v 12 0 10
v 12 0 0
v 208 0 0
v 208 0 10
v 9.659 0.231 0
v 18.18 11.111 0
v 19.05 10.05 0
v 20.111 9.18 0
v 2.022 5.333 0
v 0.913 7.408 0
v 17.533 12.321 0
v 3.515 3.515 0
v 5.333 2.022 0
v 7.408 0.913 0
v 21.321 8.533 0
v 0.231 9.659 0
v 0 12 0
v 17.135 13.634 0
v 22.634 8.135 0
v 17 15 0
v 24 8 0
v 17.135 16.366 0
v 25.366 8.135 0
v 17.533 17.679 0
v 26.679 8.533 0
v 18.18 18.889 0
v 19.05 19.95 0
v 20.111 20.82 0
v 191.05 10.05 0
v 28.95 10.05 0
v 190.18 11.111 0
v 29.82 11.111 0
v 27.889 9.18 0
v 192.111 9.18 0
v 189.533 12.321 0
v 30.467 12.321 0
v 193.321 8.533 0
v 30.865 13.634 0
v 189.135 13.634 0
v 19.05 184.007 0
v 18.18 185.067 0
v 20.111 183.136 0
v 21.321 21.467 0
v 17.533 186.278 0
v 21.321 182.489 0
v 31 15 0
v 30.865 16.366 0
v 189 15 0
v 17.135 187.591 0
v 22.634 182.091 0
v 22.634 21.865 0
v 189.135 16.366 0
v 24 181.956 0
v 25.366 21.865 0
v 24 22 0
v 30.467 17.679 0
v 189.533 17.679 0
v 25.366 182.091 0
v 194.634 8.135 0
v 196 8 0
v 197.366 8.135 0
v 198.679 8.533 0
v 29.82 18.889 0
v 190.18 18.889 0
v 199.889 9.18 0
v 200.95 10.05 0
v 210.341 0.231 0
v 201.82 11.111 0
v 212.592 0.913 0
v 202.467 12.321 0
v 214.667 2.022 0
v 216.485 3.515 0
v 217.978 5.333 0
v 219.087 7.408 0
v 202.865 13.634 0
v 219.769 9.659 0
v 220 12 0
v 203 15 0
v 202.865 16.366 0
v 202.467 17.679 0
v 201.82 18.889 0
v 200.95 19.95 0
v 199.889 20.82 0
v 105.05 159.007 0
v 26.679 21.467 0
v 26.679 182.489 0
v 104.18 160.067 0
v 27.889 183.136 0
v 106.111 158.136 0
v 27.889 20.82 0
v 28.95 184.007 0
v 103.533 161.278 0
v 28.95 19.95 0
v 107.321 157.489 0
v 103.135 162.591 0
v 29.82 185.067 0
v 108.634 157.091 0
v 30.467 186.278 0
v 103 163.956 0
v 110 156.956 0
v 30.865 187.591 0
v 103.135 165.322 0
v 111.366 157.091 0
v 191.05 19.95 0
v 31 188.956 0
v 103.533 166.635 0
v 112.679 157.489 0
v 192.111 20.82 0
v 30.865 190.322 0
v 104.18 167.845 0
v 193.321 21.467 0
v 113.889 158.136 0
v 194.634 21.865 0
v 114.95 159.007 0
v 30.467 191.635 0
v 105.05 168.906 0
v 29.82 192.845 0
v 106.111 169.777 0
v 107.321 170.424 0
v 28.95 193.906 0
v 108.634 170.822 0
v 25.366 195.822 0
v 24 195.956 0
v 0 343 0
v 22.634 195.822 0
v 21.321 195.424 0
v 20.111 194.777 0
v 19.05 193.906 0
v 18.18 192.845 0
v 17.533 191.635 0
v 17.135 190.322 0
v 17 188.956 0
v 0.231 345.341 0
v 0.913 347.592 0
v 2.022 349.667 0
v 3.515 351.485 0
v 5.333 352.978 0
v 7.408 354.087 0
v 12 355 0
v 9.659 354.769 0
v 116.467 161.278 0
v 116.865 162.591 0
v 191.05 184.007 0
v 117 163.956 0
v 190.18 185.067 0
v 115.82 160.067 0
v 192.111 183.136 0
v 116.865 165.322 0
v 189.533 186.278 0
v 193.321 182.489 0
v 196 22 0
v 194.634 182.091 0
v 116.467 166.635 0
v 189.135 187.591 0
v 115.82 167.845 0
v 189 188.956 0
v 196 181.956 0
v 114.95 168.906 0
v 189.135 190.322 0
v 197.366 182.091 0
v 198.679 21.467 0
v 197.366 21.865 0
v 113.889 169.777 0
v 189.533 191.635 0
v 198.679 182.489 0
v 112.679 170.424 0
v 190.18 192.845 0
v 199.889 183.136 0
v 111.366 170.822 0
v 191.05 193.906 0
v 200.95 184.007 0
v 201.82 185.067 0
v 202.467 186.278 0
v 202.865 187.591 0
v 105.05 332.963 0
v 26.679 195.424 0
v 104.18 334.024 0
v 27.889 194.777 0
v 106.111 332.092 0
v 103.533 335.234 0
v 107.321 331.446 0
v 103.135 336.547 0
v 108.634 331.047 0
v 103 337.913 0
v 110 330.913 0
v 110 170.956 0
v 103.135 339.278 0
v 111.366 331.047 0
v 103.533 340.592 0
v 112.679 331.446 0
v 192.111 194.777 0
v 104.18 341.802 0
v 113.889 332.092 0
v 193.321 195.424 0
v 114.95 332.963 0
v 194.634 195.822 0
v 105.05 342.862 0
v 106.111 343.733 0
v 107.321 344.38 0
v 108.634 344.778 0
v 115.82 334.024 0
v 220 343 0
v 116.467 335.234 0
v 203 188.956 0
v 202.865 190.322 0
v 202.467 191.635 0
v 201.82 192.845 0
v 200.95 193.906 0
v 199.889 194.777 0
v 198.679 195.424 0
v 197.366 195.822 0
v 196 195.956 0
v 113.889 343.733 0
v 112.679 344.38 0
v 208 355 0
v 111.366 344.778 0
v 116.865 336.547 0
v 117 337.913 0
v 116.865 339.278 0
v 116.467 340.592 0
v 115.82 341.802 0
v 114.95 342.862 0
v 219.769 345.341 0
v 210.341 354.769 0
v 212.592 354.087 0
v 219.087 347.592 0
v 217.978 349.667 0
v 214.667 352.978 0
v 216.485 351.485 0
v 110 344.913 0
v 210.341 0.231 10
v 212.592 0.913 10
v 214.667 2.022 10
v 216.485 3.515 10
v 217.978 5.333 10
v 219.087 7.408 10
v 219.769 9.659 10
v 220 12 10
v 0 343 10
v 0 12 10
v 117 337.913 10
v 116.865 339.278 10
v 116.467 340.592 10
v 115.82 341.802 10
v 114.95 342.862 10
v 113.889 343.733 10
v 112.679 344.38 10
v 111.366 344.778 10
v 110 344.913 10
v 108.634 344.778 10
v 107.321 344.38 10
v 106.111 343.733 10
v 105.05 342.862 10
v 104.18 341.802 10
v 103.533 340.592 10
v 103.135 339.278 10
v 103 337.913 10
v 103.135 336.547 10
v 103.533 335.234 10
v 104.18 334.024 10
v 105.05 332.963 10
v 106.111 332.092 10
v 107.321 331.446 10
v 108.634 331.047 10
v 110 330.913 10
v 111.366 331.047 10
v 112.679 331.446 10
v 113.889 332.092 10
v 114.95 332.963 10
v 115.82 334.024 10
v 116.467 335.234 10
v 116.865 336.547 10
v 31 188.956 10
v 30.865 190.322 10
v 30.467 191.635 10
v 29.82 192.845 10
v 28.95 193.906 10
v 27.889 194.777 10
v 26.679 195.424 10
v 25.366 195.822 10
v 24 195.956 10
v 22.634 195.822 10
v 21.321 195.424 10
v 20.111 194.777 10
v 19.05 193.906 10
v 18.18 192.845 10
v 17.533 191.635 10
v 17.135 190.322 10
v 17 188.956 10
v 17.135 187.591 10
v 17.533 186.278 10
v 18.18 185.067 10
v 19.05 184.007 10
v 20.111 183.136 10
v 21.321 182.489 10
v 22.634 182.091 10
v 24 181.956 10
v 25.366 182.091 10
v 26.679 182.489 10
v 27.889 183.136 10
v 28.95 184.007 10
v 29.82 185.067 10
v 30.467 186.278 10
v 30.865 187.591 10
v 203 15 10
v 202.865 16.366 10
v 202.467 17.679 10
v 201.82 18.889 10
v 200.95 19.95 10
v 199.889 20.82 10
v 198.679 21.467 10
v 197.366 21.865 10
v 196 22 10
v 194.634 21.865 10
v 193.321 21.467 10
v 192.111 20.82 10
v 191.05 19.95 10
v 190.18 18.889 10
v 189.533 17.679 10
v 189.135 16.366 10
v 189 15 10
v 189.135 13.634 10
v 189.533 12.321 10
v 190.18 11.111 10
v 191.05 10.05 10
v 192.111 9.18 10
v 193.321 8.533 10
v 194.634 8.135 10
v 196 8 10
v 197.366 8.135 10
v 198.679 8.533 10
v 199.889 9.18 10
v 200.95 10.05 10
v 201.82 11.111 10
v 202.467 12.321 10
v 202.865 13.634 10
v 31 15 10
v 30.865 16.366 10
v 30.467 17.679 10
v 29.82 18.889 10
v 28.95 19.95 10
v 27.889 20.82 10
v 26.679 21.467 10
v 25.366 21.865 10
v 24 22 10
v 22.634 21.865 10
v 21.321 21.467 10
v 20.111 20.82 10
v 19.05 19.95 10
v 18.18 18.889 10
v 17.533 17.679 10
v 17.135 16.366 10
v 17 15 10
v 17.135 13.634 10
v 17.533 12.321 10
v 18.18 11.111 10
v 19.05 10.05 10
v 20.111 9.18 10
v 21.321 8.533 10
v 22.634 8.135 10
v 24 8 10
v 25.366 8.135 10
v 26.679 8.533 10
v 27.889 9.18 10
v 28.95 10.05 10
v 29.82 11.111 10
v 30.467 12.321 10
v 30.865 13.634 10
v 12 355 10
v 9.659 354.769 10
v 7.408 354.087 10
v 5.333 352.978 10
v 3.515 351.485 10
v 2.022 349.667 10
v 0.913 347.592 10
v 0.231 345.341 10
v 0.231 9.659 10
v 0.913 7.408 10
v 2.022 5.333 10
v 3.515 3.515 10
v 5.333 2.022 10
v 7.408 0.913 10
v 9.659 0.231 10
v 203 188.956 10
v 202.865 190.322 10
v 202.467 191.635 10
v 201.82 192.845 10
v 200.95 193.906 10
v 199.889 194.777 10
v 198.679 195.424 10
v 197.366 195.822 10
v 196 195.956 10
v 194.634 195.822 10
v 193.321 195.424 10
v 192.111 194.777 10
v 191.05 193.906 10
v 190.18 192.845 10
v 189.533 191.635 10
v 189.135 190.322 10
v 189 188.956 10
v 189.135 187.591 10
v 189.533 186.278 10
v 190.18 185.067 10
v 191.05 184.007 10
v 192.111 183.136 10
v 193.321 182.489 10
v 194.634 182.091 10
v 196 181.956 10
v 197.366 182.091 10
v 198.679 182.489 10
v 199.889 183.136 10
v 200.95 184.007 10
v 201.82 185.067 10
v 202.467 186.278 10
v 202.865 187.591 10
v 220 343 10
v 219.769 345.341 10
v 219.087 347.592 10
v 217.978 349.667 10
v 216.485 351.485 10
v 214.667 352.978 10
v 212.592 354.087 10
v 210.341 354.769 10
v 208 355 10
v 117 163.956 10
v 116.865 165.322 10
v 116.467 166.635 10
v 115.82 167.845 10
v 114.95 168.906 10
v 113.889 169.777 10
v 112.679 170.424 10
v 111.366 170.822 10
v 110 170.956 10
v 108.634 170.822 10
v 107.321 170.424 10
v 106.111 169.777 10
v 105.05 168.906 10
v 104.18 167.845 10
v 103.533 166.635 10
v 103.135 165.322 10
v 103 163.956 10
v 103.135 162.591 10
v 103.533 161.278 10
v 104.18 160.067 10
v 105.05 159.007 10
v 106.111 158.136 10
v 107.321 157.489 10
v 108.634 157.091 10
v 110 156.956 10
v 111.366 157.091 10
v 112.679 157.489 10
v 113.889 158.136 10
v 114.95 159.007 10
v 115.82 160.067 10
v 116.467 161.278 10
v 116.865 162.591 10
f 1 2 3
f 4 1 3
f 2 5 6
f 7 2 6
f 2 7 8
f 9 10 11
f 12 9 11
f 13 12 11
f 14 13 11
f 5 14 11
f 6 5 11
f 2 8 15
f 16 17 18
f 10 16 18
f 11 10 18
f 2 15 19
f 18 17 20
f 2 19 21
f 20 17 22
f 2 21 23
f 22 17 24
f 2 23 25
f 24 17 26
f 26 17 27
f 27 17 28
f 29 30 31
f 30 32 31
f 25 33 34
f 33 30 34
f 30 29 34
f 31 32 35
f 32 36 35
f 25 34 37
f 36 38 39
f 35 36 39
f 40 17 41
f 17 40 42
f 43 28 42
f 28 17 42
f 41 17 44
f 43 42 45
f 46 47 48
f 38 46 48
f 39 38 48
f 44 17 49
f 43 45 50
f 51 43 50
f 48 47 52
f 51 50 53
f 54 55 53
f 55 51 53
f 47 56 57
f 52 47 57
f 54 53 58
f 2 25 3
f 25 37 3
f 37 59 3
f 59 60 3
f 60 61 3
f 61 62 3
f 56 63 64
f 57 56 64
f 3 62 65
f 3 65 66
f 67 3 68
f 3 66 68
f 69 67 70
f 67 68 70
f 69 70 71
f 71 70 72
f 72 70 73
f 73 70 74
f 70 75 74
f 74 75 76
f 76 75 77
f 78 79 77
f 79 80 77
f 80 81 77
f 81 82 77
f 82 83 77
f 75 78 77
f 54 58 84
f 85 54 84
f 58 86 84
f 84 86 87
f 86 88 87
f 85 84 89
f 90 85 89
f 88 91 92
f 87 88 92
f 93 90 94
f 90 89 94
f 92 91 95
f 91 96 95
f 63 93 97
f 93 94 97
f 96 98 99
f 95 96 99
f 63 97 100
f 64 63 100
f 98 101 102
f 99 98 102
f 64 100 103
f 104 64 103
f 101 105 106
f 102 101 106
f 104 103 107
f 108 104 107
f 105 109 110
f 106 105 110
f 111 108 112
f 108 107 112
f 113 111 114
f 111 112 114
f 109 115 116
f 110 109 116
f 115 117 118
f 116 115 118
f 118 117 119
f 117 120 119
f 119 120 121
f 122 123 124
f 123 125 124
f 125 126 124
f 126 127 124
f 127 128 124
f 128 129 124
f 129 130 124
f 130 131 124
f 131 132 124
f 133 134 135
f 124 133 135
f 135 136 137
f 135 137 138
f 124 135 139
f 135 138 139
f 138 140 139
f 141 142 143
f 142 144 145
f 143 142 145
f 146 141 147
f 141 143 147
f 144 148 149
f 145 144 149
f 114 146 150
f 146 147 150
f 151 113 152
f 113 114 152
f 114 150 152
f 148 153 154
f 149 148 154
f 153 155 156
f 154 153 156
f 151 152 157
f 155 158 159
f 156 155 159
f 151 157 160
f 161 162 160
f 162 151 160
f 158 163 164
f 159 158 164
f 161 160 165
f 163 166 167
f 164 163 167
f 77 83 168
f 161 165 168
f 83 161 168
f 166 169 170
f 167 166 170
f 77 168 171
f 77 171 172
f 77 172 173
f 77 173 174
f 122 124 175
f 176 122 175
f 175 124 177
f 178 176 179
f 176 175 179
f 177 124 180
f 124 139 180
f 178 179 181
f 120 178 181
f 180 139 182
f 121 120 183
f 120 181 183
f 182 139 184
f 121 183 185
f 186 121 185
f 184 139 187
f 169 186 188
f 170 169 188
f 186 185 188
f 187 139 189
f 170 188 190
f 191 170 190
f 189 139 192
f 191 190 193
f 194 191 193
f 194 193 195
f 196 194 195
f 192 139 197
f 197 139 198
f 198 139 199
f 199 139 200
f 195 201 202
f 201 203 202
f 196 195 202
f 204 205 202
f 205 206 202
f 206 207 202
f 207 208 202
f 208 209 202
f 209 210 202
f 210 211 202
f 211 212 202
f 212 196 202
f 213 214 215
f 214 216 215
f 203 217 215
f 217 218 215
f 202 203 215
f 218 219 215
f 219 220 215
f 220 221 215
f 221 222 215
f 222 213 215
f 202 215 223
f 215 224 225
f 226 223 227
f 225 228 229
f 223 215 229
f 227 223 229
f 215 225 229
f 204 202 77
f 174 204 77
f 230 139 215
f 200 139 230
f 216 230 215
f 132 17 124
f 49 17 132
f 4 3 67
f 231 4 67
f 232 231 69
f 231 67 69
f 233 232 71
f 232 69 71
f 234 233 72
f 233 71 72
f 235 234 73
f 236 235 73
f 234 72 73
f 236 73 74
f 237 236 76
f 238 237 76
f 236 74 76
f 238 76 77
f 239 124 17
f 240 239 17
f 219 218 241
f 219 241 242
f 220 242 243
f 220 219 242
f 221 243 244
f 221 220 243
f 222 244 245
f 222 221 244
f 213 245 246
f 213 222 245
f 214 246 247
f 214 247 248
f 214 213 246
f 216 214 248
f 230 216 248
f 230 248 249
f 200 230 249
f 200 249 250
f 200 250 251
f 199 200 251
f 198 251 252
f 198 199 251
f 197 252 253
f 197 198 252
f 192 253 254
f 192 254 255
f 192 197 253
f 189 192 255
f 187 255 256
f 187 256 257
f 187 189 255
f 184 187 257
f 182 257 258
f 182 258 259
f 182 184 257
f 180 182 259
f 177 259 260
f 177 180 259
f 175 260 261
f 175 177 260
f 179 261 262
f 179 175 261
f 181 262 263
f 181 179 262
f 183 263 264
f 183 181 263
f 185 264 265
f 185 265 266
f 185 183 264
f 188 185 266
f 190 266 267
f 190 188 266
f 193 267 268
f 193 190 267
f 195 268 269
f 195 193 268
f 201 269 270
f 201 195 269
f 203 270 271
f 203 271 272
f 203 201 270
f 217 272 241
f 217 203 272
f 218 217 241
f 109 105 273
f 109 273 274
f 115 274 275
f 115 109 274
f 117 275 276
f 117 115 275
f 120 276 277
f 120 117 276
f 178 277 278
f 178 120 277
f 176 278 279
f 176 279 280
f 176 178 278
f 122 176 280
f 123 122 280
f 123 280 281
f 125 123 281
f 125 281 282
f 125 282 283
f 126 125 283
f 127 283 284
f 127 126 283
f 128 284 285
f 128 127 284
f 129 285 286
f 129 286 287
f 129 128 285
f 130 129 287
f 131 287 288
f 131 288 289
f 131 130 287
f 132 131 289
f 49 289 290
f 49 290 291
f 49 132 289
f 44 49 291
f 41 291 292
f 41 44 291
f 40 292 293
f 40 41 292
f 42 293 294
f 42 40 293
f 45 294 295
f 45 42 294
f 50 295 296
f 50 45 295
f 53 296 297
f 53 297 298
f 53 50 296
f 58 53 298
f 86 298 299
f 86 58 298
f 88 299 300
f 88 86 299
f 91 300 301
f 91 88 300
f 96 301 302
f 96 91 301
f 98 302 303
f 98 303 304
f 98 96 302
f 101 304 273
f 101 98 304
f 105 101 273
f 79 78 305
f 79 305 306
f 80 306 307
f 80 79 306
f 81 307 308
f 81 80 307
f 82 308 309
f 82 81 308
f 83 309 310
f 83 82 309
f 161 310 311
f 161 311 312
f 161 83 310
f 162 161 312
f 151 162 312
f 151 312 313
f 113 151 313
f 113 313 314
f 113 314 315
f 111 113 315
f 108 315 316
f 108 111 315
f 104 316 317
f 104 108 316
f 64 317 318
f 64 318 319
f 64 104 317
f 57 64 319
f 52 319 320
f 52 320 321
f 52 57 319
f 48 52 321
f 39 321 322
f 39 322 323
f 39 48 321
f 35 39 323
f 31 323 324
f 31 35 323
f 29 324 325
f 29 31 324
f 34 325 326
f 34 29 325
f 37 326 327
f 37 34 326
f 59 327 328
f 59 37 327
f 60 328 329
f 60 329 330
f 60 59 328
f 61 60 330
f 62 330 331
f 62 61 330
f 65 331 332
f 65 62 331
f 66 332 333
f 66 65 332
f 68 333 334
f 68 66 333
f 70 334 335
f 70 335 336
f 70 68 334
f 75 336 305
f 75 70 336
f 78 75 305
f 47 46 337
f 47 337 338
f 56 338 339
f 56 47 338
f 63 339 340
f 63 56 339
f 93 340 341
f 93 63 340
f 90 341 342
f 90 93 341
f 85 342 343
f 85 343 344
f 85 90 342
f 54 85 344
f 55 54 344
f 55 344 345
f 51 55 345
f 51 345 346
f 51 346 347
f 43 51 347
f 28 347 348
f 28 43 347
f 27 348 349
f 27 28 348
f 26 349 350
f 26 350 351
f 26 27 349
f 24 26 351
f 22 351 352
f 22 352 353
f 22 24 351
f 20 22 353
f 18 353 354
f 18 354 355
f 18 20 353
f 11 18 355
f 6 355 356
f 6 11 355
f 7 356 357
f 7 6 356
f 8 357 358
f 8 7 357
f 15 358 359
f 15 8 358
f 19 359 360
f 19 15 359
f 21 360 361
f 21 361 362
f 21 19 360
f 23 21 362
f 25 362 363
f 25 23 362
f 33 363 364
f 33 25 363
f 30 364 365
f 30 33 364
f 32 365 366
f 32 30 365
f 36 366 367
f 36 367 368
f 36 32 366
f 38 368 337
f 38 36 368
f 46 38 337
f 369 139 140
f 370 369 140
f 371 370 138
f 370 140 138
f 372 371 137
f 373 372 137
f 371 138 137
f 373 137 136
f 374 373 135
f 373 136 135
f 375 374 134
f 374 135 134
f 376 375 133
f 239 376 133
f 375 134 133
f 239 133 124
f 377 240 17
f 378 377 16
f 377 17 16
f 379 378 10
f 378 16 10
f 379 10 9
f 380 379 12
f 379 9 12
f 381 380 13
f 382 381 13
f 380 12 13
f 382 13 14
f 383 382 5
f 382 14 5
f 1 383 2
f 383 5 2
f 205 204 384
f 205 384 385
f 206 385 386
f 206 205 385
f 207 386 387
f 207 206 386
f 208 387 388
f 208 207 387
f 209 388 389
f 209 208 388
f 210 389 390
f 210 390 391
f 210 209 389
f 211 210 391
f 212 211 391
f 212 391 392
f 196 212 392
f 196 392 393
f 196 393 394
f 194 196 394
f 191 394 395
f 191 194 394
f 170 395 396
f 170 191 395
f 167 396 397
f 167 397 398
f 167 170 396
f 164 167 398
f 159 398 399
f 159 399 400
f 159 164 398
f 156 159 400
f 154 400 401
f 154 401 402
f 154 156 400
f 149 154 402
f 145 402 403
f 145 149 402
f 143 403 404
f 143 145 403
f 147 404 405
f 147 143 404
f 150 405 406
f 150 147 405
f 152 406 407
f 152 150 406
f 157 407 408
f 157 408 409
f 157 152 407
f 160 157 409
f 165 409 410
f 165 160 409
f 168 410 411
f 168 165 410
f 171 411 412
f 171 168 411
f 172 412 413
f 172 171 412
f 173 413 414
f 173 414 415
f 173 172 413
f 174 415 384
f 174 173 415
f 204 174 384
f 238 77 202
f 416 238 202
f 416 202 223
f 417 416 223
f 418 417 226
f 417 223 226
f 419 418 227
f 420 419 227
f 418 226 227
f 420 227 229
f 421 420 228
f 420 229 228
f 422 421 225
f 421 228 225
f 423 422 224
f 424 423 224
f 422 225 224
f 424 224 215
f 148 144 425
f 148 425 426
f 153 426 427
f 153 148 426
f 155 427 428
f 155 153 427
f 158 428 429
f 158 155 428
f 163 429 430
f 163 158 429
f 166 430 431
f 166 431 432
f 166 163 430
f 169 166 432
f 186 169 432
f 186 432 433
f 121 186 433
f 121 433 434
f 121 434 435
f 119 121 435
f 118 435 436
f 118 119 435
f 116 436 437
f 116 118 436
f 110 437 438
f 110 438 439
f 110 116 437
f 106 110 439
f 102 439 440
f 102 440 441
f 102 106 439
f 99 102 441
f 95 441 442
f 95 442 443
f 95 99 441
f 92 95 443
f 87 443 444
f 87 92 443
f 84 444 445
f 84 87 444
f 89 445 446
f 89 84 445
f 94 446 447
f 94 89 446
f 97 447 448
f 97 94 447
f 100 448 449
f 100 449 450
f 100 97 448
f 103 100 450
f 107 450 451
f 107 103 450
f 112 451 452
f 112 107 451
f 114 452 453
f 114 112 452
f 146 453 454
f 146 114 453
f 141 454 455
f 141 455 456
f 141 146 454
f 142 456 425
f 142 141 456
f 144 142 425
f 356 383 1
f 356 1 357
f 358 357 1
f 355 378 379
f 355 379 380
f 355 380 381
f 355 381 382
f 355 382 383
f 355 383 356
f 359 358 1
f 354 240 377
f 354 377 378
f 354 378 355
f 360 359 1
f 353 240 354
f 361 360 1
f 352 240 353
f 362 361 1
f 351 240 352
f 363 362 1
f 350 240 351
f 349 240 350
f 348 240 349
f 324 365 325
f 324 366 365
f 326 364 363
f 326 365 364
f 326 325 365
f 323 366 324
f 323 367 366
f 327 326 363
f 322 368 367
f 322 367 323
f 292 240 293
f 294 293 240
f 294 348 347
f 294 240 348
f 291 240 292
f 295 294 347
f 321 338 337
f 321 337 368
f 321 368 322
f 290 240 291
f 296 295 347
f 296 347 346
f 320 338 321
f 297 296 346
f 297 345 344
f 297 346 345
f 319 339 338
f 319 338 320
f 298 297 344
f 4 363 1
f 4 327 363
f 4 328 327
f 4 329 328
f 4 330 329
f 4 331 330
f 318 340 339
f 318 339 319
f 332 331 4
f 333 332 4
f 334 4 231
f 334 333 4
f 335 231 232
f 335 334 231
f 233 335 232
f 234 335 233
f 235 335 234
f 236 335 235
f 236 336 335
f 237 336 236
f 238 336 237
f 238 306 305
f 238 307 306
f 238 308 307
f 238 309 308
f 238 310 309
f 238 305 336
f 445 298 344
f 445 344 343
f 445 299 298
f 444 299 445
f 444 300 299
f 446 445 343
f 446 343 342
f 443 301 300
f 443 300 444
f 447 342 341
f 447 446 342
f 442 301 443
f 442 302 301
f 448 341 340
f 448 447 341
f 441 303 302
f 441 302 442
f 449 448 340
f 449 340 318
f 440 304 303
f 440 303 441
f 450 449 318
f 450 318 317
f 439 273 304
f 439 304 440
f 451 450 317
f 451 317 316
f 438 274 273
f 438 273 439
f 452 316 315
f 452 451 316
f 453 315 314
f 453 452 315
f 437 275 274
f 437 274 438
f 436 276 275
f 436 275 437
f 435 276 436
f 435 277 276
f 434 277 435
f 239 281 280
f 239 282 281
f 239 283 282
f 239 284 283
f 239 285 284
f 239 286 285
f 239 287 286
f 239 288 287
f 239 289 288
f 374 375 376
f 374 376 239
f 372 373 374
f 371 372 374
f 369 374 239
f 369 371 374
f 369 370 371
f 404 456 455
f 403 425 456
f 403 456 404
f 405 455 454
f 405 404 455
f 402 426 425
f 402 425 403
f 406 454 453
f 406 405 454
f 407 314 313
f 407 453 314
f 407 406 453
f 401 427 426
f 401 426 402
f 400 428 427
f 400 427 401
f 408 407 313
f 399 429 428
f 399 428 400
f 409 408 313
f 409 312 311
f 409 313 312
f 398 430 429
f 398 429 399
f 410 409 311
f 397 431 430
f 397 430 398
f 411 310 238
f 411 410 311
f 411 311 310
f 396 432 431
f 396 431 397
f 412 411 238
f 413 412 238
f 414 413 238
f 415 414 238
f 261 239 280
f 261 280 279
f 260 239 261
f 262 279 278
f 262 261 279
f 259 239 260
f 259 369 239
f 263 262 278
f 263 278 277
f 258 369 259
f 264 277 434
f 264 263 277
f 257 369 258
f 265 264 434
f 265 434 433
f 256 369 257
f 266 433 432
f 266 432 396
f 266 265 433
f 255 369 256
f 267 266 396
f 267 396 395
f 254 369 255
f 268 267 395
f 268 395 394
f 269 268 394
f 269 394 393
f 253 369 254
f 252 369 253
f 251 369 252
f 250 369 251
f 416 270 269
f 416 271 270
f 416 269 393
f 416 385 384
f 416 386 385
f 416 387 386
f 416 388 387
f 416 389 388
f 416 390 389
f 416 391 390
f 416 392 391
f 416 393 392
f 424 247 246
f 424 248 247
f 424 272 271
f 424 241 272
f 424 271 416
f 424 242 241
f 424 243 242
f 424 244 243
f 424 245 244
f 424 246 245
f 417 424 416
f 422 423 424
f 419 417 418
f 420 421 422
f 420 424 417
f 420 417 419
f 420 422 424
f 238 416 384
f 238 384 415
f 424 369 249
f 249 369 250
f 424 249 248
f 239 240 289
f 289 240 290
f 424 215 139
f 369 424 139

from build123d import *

# Parameters (mm, degrees)
F0_R     = 7
F1_DEPTH = 10


with BuildPart() as f1:
    # F0 (on Top) → F1 (new body)
    with BuildSketch(Plane.XY):
        with BuildLine():
            ThreePointArc((0, 12), (3.514719, 3.514719), (12, 0))
            Line((12, 0), (208, 0))
            ThreePointArc((208, 0), (216.485281, 3.514719), (220, 12))
            Line((220, 12), (220, 343))
            ThreePointArc((220, 343), (216.485281, 351.485281), (208, 355))
            Line((208, 355), (12, 355))
            ThreePointArc((12, 355), (3.514719, 351.485281), (0, 343))
            Line((0, 343), (0, 12))
        make_face()
        with Locations((24, 15)):
            Circle(F0_R, mode=Mode.SUBTRACT)
        with Locations((196, 15)):
            Circle(F0_R, mode=Mode.SUBTRACT)
        with Locations((110, 163.956369)):
            Circle(F0_R, mode=Mode.SUBTRACT)
        with Locations((24, 188.956369)):
            Circle(F0_R, mode=Mode.SUBTRACT)
        with Locations((196, 188.956369)):
            Circle(F0_R, mode=Mode.SUBTRACT)
        with Locations((110, 337.912739)):
            Circle(F0_R, mode=Mode.SUBTRACT)
    extrude(amount=F1_DEPTH)


solid = f1.part
